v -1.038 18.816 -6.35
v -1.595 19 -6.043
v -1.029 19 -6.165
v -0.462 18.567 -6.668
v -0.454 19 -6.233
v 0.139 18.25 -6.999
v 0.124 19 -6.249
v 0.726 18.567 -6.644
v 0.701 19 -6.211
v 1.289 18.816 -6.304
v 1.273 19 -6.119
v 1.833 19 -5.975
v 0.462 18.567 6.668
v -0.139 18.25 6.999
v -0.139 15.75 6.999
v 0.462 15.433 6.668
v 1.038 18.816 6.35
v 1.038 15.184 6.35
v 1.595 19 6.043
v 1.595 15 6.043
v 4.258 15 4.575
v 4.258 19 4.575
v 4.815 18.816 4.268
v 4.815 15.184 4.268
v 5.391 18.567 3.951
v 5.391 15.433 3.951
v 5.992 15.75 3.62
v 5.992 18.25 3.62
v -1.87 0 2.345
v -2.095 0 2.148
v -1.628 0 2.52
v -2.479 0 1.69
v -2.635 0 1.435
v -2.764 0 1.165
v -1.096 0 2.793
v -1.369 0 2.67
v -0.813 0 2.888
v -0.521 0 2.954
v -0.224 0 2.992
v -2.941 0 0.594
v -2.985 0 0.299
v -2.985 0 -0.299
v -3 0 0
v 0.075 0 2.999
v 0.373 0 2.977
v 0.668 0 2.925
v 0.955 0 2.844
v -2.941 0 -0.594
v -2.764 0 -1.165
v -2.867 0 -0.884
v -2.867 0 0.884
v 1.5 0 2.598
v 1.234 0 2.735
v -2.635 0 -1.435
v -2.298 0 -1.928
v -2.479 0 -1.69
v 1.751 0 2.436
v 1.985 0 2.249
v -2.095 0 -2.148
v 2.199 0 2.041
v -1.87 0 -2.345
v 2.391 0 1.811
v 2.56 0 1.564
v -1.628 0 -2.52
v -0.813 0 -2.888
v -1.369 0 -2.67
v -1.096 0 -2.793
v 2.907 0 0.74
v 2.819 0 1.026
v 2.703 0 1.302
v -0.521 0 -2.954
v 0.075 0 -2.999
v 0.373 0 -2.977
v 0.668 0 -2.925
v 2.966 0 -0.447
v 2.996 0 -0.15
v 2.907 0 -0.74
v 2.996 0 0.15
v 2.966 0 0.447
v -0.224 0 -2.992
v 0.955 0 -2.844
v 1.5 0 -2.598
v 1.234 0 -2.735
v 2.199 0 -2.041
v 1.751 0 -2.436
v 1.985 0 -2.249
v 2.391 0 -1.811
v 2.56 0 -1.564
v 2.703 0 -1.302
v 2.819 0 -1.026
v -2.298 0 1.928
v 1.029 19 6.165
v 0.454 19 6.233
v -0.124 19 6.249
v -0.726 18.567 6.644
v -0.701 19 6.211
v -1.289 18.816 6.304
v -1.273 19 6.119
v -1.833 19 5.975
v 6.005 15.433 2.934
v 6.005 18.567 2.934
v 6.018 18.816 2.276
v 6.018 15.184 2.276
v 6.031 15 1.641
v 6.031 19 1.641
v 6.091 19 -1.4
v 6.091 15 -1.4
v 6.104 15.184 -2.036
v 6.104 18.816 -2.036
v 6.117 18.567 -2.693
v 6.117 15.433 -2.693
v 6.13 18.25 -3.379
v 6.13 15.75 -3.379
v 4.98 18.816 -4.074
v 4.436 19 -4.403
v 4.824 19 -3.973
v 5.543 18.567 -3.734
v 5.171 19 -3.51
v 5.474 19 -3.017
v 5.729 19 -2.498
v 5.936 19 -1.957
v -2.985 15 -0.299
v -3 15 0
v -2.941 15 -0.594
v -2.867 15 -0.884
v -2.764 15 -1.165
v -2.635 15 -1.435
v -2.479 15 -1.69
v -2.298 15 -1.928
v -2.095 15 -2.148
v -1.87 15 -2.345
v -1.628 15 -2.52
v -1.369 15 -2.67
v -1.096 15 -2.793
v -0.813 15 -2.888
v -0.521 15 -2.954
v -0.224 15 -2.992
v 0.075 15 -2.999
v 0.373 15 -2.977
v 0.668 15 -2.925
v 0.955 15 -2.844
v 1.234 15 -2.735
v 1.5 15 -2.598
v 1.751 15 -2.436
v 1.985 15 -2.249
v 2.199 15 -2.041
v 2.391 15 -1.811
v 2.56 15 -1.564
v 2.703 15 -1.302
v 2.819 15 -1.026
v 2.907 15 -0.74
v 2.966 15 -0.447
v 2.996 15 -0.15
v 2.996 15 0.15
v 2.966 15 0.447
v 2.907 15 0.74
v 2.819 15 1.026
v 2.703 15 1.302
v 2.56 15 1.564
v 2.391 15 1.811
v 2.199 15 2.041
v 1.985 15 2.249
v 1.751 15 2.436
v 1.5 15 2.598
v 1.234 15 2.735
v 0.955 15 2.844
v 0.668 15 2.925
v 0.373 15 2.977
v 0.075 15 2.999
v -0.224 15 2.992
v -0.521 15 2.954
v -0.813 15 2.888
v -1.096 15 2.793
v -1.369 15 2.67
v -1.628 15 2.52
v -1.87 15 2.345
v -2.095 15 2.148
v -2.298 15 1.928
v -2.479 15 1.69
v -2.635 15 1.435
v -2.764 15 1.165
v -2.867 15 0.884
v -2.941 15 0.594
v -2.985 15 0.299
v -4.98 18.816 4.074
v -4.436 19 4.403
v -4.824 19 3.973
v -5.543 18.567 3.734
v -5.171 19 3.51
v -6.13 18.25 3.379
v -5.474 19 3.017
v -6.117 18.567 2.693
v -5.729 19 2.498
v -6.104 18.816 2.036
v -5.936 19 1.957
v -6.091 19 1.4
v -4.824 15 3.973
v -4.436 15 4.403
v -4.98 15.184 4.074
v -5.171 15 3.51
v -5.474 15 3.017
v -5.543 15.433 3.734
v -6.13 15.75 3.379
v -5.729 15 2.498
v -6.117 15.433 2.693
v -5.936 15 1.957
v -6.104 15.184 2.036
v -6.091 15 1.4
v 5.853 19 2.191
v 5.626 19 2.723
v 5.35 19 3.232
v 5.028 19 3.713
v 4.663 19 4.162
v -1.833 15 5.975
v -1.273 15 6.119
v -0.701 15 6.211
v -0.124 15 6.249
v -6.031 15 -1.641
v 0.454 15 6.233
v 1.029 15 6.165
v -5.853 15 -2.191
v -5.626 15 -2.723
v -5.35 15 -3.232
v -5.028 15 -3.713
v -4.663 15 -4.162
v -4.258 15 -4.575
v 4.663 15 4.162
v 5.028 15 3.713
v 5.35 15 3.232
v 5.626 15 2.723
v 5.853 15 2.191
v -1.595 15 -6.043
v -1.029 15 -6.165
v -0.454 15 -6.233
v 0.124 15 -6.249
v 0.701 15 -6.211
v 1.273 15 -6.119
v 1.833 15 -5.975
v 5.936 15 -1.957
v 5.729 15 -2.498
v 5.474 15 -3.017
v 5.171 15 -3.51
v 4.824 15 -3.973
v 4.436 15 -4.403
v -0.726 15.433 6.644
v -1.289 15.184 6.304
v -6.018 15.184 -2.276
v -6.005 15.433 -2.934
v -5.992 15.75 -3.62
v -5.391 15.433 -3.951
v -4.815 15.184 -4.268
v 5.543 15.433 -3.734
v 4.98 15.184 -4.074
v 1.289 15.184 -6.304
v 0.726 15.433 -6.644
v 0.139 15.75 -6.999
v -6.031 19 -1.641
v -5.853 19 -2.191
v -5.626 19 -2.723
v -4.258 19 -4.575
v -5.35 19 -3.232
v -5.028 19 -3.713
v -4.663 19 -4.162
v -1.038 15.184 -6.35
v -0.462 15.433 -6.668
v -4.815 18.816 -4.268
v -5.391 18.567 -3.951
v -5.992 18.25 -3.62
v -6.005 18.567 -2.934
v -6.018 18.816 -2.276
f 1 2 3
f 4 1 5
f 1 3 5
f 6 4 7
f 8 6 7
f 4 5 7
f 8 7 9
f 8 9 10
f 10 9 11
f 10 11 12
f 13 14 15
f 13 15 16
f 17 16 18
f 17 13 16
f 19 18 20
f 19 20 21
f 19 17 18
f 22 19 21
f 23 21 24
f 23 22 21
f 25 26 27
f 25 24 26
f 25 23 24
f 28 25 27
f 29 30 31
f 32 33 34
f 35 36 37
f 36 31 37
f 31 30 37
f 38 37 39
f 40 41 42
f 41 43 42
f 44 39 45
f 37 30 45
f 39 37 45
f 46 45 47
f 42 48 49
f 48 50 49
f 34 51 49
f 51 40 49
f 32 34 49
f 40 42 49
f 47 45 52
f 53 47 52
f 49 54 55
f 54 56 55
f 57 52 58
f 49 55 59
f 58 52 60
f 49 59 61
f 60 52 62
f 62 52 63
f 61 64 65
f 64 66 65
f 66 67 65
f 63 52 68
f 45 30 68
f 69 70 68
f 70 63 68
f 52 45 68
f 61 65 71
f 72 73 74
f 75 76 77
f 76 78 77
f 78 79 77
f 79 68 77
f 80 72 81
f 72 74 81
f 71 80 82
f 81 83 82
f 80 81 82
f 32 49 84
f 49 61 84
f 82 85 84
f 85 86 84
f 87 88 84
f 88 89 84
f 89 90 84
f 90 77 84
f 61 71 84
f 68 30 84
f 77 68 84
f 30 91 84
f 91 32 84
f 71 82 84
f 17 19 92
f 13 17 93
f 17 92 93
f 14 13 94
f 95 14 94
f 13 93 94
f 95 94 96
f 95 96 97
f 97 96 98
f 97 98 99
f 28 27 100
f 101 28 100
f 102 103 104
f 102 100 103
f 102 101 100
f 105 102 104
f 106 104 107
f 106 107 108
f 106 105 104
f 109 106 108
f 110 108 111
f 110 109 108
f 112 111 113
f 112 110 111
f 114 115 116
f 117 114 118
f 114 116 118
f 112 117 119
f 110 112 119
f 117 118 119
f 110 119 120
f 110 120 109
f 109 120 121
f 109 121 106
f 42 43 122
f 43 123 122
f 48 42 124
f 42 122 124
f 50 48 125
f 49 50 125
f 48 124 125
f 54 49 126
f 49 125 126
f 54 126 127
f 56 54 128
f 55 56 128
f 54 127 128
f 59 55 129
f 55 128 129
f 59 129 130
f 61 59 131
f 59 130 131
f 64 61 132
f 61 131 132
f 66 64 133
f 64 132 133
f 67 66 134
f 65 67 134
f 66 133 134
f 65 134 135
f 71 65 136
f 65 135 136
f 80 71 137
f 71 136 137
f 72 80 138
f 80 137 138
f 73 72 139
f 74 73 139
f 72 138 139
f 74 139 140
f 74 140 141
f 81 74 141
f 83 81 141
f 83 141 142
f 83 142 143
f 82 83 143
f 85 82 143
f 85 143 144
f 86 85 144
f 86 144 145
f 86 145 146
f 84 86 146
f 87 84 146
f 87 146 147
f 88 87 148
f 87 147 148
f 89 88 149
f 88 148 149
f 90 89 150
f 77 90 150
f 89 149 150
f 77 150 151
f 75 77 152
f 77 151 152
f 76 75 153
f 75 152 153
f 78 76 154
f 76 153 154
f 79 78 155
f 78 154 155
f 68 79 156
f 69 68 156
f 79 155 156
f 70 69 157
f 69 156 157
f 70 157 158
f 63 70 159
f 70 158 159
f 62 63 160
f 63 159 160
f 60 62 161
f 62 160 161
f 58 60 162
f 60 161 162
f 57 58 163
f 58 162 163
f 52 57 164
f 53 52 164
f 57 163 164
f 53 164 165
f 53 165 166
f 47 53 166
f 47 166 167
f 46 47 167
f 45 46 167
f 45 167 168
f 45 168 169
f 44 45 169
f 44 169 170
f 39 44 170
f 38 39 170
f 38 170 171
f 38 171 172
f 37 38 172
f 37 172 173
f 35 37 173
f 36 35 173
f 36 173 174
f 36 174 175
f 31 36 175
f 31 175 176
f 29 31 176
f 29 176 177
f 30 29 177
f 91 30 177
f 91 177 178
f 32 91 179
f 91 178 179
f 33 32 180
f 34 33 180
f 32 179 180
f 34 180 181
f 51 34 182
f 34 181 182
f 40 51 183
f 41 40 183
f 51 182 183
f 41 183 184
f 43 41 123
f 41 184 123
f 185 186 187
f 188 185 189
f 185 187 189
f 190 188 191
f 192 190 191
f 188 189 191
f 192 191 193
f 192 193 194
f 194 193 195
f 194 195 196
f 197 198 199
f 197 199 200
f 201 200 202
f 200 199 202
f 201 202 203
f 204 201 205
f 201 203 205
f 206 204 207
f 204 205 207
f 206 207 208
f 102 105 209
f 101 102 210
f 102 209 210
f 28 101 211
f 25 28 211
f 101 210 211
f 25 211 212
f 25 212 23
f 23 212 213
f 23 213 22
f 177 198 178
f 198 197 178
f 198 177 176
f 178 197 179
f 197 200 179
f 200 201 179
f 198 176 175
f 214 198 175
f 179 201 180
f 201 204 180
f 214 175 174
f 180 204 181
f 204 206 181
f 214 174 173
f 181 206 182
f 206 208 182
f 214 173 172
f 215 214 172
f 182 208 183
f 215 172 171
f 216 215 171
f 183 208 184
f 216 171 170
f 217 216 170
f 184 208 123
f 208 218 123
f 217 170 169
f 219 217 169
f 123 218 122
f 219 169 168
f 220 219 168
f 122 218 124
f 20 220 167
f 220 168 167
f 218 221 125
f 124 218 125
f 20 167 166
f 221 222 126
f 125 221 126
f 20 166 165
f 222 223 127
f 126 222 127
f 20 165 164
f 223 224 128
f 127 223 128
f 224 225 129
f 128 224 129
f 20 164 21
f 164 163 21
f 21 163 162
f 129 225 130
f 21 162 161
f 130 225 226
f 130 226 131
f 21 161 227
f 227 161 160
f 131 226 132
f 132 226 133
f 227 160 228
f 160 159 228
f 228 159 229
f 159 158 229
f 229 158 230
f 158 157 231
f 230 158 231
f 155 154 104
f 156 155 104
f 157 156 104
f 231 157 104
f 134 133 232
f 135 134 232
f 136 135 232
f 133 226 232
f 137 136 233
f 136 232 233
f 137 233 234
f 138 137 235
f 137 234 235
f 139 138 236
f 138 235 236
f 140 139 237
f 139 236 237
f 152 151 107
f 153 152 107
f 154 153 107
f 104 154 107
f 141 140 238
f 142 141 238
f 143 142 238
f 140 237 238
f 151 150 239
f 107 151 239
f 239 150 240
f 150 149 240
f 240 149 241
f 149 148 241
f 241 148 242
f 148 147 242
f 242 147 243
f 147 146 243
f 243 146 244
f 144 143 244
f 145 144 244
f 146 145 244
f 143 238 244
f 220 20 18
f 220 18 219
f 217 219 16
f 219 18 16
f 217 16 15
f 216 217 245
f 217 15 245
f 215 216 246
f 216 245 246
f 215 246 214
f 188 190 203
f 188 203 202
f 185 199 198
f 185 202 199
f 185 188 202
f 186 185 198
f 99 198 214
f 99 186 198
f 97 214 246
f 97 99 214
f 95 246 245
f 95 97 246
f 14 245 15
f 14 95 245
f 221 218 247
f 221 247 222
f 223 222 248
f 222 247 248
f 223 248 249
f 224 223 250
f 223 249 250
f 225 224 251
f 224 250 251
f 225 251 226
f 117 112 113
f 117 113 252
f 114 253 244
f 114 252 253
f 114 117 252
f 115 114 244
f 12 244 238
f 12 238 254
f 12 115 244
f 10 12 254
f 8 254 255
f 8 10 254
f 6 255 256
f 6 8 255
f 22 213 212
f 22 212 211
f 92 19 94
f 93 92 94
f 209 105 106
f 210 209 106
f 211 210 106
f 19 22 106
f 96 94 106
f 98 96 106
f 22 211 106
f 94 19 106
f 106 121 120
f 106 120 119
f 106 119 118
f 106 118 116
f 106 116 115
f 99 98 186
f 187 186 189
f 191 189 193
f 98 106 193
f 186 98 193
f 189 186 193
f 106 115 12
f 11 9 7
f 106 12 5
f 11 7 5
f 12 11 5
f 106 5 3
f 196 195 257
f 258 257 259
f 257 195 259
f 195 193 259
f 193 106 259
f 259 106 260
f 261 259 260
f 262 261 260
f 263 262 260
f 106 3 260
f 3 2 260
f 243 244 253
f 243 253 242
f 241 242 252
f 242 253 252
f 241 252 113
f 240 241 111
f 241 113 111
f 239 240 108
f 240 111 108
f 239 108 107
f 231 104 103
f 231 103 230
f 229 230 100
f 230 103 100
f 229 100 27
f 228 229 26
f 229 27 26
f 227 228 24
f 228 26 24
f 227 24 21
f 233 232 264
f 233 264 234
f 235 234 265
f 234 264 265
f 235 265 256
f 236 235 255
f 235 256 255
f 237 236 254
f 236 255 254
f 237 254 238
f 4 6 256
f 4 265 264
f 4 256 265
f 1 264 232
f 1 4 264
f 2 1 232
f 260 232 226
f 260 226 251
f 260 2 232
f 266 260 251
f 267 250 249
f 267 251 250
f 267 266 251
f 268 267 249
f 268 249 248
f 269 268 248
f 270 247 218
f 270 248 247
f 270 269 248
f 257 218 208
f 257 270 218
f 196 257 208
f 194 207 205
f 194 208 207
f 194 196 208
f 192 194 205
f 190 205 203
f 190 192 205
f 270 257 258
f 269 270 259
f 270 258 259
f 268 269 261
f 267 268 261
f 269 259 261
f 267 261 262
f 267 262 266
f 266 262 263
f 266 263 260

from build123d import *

# Parameters (mm, degrees)
CHAMFER1_SIZE      = 0.75
SKETCH2_OUTSIDE_W  = 21.488
SKETCH2_OUTSIDE_H  = 21.488
CUT_EXTRUDE1_DEPTH = 10


with BuildPart() as part:
    # Sketch1 → Revolve1 (revolve)
    with BuildSketch(Plane.XY):
        Polygon((0, 0), (-3, 0), (-3, 15), (-7, 15), (-7, 19), (0, 19), align=None)
    revolve(axis=Axis((0, 26.2734375, 0), (0, -1, 0)))

    # Chamfer1
    chamfer1_edges = [part.edges().sort_by_distance(p)[0] for p in [
        (7, 19, 0),
        (7, 15, 0),
    ]]
    chamfer(chamfer1_edges, length=CHAMFER1_SIZE)

    # Sketch2 outside → Cut-Extrude1 (cut)
    with BuildSketch(Plane(origin=(0, 19, 0), x_dir=(1, 0, 0), z_dir=(0, 1, 0))):
        Rectangle(SKETCH2_OUTSIDE_W, SKETCH2_OUTSIDE_H)
        Polygon((0.138817894, 6.998623407), (-5.991576715, 3.619531526), (-6.130394609, -3.379091881), (-0.138817894, -6.998623407), (5.991576715, -3.619531526), (6.130394609, 3.379091881), align=None, mode=Mode.SUBTRACT)
    extrude(amount=-CUT_EXTRUDE1_DEPTH, mode=Mode.SUBTRACT)


solid = part.part
